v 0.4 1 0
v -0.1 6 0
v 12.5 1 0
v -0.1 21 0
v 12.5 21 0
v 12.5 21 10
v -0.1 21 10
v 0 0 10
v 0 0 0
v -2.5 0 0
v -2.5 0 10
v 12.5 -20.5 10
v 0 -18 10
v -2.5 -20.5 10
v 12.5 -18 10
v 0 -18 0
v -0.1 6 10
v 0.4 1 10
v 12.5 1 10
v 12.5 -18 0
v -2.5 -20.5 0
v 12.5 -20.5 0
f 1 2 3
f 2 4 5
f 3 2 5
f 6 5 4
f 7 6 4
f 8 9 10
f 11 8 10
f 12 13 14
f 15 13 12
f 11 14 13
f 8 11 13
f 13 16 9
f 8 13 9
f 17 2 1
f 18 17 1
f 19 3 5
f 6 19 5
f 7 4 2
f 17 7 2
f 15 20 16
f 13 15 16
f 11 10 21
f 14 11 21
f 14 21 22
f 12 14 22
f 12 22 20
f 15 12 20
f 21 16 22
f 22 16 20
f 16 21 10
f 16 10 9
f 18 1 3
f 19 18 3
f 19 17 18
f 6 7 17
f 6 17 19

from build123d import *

# Parameters (mm, degrees)
F1_DEPTH = 10


with BuildPart() as f1:
    # F0 (on Top) → F1 (new body)
    with BuildSketch(Plane.XY):
        Polygon((0.4, 1), (12.5, 1), (12.5, 21), (-0.1, 21), (-0.1, 6), align=None)
        Polygon((0, -18), (0, 0), (-2.5, 0), (-2.5, -18), (-2.5, -20.5), (12.5, -20.5), (12.5, -18), align=None)
    extrude(amount=F1_DEPTH)


solid = f1.part
